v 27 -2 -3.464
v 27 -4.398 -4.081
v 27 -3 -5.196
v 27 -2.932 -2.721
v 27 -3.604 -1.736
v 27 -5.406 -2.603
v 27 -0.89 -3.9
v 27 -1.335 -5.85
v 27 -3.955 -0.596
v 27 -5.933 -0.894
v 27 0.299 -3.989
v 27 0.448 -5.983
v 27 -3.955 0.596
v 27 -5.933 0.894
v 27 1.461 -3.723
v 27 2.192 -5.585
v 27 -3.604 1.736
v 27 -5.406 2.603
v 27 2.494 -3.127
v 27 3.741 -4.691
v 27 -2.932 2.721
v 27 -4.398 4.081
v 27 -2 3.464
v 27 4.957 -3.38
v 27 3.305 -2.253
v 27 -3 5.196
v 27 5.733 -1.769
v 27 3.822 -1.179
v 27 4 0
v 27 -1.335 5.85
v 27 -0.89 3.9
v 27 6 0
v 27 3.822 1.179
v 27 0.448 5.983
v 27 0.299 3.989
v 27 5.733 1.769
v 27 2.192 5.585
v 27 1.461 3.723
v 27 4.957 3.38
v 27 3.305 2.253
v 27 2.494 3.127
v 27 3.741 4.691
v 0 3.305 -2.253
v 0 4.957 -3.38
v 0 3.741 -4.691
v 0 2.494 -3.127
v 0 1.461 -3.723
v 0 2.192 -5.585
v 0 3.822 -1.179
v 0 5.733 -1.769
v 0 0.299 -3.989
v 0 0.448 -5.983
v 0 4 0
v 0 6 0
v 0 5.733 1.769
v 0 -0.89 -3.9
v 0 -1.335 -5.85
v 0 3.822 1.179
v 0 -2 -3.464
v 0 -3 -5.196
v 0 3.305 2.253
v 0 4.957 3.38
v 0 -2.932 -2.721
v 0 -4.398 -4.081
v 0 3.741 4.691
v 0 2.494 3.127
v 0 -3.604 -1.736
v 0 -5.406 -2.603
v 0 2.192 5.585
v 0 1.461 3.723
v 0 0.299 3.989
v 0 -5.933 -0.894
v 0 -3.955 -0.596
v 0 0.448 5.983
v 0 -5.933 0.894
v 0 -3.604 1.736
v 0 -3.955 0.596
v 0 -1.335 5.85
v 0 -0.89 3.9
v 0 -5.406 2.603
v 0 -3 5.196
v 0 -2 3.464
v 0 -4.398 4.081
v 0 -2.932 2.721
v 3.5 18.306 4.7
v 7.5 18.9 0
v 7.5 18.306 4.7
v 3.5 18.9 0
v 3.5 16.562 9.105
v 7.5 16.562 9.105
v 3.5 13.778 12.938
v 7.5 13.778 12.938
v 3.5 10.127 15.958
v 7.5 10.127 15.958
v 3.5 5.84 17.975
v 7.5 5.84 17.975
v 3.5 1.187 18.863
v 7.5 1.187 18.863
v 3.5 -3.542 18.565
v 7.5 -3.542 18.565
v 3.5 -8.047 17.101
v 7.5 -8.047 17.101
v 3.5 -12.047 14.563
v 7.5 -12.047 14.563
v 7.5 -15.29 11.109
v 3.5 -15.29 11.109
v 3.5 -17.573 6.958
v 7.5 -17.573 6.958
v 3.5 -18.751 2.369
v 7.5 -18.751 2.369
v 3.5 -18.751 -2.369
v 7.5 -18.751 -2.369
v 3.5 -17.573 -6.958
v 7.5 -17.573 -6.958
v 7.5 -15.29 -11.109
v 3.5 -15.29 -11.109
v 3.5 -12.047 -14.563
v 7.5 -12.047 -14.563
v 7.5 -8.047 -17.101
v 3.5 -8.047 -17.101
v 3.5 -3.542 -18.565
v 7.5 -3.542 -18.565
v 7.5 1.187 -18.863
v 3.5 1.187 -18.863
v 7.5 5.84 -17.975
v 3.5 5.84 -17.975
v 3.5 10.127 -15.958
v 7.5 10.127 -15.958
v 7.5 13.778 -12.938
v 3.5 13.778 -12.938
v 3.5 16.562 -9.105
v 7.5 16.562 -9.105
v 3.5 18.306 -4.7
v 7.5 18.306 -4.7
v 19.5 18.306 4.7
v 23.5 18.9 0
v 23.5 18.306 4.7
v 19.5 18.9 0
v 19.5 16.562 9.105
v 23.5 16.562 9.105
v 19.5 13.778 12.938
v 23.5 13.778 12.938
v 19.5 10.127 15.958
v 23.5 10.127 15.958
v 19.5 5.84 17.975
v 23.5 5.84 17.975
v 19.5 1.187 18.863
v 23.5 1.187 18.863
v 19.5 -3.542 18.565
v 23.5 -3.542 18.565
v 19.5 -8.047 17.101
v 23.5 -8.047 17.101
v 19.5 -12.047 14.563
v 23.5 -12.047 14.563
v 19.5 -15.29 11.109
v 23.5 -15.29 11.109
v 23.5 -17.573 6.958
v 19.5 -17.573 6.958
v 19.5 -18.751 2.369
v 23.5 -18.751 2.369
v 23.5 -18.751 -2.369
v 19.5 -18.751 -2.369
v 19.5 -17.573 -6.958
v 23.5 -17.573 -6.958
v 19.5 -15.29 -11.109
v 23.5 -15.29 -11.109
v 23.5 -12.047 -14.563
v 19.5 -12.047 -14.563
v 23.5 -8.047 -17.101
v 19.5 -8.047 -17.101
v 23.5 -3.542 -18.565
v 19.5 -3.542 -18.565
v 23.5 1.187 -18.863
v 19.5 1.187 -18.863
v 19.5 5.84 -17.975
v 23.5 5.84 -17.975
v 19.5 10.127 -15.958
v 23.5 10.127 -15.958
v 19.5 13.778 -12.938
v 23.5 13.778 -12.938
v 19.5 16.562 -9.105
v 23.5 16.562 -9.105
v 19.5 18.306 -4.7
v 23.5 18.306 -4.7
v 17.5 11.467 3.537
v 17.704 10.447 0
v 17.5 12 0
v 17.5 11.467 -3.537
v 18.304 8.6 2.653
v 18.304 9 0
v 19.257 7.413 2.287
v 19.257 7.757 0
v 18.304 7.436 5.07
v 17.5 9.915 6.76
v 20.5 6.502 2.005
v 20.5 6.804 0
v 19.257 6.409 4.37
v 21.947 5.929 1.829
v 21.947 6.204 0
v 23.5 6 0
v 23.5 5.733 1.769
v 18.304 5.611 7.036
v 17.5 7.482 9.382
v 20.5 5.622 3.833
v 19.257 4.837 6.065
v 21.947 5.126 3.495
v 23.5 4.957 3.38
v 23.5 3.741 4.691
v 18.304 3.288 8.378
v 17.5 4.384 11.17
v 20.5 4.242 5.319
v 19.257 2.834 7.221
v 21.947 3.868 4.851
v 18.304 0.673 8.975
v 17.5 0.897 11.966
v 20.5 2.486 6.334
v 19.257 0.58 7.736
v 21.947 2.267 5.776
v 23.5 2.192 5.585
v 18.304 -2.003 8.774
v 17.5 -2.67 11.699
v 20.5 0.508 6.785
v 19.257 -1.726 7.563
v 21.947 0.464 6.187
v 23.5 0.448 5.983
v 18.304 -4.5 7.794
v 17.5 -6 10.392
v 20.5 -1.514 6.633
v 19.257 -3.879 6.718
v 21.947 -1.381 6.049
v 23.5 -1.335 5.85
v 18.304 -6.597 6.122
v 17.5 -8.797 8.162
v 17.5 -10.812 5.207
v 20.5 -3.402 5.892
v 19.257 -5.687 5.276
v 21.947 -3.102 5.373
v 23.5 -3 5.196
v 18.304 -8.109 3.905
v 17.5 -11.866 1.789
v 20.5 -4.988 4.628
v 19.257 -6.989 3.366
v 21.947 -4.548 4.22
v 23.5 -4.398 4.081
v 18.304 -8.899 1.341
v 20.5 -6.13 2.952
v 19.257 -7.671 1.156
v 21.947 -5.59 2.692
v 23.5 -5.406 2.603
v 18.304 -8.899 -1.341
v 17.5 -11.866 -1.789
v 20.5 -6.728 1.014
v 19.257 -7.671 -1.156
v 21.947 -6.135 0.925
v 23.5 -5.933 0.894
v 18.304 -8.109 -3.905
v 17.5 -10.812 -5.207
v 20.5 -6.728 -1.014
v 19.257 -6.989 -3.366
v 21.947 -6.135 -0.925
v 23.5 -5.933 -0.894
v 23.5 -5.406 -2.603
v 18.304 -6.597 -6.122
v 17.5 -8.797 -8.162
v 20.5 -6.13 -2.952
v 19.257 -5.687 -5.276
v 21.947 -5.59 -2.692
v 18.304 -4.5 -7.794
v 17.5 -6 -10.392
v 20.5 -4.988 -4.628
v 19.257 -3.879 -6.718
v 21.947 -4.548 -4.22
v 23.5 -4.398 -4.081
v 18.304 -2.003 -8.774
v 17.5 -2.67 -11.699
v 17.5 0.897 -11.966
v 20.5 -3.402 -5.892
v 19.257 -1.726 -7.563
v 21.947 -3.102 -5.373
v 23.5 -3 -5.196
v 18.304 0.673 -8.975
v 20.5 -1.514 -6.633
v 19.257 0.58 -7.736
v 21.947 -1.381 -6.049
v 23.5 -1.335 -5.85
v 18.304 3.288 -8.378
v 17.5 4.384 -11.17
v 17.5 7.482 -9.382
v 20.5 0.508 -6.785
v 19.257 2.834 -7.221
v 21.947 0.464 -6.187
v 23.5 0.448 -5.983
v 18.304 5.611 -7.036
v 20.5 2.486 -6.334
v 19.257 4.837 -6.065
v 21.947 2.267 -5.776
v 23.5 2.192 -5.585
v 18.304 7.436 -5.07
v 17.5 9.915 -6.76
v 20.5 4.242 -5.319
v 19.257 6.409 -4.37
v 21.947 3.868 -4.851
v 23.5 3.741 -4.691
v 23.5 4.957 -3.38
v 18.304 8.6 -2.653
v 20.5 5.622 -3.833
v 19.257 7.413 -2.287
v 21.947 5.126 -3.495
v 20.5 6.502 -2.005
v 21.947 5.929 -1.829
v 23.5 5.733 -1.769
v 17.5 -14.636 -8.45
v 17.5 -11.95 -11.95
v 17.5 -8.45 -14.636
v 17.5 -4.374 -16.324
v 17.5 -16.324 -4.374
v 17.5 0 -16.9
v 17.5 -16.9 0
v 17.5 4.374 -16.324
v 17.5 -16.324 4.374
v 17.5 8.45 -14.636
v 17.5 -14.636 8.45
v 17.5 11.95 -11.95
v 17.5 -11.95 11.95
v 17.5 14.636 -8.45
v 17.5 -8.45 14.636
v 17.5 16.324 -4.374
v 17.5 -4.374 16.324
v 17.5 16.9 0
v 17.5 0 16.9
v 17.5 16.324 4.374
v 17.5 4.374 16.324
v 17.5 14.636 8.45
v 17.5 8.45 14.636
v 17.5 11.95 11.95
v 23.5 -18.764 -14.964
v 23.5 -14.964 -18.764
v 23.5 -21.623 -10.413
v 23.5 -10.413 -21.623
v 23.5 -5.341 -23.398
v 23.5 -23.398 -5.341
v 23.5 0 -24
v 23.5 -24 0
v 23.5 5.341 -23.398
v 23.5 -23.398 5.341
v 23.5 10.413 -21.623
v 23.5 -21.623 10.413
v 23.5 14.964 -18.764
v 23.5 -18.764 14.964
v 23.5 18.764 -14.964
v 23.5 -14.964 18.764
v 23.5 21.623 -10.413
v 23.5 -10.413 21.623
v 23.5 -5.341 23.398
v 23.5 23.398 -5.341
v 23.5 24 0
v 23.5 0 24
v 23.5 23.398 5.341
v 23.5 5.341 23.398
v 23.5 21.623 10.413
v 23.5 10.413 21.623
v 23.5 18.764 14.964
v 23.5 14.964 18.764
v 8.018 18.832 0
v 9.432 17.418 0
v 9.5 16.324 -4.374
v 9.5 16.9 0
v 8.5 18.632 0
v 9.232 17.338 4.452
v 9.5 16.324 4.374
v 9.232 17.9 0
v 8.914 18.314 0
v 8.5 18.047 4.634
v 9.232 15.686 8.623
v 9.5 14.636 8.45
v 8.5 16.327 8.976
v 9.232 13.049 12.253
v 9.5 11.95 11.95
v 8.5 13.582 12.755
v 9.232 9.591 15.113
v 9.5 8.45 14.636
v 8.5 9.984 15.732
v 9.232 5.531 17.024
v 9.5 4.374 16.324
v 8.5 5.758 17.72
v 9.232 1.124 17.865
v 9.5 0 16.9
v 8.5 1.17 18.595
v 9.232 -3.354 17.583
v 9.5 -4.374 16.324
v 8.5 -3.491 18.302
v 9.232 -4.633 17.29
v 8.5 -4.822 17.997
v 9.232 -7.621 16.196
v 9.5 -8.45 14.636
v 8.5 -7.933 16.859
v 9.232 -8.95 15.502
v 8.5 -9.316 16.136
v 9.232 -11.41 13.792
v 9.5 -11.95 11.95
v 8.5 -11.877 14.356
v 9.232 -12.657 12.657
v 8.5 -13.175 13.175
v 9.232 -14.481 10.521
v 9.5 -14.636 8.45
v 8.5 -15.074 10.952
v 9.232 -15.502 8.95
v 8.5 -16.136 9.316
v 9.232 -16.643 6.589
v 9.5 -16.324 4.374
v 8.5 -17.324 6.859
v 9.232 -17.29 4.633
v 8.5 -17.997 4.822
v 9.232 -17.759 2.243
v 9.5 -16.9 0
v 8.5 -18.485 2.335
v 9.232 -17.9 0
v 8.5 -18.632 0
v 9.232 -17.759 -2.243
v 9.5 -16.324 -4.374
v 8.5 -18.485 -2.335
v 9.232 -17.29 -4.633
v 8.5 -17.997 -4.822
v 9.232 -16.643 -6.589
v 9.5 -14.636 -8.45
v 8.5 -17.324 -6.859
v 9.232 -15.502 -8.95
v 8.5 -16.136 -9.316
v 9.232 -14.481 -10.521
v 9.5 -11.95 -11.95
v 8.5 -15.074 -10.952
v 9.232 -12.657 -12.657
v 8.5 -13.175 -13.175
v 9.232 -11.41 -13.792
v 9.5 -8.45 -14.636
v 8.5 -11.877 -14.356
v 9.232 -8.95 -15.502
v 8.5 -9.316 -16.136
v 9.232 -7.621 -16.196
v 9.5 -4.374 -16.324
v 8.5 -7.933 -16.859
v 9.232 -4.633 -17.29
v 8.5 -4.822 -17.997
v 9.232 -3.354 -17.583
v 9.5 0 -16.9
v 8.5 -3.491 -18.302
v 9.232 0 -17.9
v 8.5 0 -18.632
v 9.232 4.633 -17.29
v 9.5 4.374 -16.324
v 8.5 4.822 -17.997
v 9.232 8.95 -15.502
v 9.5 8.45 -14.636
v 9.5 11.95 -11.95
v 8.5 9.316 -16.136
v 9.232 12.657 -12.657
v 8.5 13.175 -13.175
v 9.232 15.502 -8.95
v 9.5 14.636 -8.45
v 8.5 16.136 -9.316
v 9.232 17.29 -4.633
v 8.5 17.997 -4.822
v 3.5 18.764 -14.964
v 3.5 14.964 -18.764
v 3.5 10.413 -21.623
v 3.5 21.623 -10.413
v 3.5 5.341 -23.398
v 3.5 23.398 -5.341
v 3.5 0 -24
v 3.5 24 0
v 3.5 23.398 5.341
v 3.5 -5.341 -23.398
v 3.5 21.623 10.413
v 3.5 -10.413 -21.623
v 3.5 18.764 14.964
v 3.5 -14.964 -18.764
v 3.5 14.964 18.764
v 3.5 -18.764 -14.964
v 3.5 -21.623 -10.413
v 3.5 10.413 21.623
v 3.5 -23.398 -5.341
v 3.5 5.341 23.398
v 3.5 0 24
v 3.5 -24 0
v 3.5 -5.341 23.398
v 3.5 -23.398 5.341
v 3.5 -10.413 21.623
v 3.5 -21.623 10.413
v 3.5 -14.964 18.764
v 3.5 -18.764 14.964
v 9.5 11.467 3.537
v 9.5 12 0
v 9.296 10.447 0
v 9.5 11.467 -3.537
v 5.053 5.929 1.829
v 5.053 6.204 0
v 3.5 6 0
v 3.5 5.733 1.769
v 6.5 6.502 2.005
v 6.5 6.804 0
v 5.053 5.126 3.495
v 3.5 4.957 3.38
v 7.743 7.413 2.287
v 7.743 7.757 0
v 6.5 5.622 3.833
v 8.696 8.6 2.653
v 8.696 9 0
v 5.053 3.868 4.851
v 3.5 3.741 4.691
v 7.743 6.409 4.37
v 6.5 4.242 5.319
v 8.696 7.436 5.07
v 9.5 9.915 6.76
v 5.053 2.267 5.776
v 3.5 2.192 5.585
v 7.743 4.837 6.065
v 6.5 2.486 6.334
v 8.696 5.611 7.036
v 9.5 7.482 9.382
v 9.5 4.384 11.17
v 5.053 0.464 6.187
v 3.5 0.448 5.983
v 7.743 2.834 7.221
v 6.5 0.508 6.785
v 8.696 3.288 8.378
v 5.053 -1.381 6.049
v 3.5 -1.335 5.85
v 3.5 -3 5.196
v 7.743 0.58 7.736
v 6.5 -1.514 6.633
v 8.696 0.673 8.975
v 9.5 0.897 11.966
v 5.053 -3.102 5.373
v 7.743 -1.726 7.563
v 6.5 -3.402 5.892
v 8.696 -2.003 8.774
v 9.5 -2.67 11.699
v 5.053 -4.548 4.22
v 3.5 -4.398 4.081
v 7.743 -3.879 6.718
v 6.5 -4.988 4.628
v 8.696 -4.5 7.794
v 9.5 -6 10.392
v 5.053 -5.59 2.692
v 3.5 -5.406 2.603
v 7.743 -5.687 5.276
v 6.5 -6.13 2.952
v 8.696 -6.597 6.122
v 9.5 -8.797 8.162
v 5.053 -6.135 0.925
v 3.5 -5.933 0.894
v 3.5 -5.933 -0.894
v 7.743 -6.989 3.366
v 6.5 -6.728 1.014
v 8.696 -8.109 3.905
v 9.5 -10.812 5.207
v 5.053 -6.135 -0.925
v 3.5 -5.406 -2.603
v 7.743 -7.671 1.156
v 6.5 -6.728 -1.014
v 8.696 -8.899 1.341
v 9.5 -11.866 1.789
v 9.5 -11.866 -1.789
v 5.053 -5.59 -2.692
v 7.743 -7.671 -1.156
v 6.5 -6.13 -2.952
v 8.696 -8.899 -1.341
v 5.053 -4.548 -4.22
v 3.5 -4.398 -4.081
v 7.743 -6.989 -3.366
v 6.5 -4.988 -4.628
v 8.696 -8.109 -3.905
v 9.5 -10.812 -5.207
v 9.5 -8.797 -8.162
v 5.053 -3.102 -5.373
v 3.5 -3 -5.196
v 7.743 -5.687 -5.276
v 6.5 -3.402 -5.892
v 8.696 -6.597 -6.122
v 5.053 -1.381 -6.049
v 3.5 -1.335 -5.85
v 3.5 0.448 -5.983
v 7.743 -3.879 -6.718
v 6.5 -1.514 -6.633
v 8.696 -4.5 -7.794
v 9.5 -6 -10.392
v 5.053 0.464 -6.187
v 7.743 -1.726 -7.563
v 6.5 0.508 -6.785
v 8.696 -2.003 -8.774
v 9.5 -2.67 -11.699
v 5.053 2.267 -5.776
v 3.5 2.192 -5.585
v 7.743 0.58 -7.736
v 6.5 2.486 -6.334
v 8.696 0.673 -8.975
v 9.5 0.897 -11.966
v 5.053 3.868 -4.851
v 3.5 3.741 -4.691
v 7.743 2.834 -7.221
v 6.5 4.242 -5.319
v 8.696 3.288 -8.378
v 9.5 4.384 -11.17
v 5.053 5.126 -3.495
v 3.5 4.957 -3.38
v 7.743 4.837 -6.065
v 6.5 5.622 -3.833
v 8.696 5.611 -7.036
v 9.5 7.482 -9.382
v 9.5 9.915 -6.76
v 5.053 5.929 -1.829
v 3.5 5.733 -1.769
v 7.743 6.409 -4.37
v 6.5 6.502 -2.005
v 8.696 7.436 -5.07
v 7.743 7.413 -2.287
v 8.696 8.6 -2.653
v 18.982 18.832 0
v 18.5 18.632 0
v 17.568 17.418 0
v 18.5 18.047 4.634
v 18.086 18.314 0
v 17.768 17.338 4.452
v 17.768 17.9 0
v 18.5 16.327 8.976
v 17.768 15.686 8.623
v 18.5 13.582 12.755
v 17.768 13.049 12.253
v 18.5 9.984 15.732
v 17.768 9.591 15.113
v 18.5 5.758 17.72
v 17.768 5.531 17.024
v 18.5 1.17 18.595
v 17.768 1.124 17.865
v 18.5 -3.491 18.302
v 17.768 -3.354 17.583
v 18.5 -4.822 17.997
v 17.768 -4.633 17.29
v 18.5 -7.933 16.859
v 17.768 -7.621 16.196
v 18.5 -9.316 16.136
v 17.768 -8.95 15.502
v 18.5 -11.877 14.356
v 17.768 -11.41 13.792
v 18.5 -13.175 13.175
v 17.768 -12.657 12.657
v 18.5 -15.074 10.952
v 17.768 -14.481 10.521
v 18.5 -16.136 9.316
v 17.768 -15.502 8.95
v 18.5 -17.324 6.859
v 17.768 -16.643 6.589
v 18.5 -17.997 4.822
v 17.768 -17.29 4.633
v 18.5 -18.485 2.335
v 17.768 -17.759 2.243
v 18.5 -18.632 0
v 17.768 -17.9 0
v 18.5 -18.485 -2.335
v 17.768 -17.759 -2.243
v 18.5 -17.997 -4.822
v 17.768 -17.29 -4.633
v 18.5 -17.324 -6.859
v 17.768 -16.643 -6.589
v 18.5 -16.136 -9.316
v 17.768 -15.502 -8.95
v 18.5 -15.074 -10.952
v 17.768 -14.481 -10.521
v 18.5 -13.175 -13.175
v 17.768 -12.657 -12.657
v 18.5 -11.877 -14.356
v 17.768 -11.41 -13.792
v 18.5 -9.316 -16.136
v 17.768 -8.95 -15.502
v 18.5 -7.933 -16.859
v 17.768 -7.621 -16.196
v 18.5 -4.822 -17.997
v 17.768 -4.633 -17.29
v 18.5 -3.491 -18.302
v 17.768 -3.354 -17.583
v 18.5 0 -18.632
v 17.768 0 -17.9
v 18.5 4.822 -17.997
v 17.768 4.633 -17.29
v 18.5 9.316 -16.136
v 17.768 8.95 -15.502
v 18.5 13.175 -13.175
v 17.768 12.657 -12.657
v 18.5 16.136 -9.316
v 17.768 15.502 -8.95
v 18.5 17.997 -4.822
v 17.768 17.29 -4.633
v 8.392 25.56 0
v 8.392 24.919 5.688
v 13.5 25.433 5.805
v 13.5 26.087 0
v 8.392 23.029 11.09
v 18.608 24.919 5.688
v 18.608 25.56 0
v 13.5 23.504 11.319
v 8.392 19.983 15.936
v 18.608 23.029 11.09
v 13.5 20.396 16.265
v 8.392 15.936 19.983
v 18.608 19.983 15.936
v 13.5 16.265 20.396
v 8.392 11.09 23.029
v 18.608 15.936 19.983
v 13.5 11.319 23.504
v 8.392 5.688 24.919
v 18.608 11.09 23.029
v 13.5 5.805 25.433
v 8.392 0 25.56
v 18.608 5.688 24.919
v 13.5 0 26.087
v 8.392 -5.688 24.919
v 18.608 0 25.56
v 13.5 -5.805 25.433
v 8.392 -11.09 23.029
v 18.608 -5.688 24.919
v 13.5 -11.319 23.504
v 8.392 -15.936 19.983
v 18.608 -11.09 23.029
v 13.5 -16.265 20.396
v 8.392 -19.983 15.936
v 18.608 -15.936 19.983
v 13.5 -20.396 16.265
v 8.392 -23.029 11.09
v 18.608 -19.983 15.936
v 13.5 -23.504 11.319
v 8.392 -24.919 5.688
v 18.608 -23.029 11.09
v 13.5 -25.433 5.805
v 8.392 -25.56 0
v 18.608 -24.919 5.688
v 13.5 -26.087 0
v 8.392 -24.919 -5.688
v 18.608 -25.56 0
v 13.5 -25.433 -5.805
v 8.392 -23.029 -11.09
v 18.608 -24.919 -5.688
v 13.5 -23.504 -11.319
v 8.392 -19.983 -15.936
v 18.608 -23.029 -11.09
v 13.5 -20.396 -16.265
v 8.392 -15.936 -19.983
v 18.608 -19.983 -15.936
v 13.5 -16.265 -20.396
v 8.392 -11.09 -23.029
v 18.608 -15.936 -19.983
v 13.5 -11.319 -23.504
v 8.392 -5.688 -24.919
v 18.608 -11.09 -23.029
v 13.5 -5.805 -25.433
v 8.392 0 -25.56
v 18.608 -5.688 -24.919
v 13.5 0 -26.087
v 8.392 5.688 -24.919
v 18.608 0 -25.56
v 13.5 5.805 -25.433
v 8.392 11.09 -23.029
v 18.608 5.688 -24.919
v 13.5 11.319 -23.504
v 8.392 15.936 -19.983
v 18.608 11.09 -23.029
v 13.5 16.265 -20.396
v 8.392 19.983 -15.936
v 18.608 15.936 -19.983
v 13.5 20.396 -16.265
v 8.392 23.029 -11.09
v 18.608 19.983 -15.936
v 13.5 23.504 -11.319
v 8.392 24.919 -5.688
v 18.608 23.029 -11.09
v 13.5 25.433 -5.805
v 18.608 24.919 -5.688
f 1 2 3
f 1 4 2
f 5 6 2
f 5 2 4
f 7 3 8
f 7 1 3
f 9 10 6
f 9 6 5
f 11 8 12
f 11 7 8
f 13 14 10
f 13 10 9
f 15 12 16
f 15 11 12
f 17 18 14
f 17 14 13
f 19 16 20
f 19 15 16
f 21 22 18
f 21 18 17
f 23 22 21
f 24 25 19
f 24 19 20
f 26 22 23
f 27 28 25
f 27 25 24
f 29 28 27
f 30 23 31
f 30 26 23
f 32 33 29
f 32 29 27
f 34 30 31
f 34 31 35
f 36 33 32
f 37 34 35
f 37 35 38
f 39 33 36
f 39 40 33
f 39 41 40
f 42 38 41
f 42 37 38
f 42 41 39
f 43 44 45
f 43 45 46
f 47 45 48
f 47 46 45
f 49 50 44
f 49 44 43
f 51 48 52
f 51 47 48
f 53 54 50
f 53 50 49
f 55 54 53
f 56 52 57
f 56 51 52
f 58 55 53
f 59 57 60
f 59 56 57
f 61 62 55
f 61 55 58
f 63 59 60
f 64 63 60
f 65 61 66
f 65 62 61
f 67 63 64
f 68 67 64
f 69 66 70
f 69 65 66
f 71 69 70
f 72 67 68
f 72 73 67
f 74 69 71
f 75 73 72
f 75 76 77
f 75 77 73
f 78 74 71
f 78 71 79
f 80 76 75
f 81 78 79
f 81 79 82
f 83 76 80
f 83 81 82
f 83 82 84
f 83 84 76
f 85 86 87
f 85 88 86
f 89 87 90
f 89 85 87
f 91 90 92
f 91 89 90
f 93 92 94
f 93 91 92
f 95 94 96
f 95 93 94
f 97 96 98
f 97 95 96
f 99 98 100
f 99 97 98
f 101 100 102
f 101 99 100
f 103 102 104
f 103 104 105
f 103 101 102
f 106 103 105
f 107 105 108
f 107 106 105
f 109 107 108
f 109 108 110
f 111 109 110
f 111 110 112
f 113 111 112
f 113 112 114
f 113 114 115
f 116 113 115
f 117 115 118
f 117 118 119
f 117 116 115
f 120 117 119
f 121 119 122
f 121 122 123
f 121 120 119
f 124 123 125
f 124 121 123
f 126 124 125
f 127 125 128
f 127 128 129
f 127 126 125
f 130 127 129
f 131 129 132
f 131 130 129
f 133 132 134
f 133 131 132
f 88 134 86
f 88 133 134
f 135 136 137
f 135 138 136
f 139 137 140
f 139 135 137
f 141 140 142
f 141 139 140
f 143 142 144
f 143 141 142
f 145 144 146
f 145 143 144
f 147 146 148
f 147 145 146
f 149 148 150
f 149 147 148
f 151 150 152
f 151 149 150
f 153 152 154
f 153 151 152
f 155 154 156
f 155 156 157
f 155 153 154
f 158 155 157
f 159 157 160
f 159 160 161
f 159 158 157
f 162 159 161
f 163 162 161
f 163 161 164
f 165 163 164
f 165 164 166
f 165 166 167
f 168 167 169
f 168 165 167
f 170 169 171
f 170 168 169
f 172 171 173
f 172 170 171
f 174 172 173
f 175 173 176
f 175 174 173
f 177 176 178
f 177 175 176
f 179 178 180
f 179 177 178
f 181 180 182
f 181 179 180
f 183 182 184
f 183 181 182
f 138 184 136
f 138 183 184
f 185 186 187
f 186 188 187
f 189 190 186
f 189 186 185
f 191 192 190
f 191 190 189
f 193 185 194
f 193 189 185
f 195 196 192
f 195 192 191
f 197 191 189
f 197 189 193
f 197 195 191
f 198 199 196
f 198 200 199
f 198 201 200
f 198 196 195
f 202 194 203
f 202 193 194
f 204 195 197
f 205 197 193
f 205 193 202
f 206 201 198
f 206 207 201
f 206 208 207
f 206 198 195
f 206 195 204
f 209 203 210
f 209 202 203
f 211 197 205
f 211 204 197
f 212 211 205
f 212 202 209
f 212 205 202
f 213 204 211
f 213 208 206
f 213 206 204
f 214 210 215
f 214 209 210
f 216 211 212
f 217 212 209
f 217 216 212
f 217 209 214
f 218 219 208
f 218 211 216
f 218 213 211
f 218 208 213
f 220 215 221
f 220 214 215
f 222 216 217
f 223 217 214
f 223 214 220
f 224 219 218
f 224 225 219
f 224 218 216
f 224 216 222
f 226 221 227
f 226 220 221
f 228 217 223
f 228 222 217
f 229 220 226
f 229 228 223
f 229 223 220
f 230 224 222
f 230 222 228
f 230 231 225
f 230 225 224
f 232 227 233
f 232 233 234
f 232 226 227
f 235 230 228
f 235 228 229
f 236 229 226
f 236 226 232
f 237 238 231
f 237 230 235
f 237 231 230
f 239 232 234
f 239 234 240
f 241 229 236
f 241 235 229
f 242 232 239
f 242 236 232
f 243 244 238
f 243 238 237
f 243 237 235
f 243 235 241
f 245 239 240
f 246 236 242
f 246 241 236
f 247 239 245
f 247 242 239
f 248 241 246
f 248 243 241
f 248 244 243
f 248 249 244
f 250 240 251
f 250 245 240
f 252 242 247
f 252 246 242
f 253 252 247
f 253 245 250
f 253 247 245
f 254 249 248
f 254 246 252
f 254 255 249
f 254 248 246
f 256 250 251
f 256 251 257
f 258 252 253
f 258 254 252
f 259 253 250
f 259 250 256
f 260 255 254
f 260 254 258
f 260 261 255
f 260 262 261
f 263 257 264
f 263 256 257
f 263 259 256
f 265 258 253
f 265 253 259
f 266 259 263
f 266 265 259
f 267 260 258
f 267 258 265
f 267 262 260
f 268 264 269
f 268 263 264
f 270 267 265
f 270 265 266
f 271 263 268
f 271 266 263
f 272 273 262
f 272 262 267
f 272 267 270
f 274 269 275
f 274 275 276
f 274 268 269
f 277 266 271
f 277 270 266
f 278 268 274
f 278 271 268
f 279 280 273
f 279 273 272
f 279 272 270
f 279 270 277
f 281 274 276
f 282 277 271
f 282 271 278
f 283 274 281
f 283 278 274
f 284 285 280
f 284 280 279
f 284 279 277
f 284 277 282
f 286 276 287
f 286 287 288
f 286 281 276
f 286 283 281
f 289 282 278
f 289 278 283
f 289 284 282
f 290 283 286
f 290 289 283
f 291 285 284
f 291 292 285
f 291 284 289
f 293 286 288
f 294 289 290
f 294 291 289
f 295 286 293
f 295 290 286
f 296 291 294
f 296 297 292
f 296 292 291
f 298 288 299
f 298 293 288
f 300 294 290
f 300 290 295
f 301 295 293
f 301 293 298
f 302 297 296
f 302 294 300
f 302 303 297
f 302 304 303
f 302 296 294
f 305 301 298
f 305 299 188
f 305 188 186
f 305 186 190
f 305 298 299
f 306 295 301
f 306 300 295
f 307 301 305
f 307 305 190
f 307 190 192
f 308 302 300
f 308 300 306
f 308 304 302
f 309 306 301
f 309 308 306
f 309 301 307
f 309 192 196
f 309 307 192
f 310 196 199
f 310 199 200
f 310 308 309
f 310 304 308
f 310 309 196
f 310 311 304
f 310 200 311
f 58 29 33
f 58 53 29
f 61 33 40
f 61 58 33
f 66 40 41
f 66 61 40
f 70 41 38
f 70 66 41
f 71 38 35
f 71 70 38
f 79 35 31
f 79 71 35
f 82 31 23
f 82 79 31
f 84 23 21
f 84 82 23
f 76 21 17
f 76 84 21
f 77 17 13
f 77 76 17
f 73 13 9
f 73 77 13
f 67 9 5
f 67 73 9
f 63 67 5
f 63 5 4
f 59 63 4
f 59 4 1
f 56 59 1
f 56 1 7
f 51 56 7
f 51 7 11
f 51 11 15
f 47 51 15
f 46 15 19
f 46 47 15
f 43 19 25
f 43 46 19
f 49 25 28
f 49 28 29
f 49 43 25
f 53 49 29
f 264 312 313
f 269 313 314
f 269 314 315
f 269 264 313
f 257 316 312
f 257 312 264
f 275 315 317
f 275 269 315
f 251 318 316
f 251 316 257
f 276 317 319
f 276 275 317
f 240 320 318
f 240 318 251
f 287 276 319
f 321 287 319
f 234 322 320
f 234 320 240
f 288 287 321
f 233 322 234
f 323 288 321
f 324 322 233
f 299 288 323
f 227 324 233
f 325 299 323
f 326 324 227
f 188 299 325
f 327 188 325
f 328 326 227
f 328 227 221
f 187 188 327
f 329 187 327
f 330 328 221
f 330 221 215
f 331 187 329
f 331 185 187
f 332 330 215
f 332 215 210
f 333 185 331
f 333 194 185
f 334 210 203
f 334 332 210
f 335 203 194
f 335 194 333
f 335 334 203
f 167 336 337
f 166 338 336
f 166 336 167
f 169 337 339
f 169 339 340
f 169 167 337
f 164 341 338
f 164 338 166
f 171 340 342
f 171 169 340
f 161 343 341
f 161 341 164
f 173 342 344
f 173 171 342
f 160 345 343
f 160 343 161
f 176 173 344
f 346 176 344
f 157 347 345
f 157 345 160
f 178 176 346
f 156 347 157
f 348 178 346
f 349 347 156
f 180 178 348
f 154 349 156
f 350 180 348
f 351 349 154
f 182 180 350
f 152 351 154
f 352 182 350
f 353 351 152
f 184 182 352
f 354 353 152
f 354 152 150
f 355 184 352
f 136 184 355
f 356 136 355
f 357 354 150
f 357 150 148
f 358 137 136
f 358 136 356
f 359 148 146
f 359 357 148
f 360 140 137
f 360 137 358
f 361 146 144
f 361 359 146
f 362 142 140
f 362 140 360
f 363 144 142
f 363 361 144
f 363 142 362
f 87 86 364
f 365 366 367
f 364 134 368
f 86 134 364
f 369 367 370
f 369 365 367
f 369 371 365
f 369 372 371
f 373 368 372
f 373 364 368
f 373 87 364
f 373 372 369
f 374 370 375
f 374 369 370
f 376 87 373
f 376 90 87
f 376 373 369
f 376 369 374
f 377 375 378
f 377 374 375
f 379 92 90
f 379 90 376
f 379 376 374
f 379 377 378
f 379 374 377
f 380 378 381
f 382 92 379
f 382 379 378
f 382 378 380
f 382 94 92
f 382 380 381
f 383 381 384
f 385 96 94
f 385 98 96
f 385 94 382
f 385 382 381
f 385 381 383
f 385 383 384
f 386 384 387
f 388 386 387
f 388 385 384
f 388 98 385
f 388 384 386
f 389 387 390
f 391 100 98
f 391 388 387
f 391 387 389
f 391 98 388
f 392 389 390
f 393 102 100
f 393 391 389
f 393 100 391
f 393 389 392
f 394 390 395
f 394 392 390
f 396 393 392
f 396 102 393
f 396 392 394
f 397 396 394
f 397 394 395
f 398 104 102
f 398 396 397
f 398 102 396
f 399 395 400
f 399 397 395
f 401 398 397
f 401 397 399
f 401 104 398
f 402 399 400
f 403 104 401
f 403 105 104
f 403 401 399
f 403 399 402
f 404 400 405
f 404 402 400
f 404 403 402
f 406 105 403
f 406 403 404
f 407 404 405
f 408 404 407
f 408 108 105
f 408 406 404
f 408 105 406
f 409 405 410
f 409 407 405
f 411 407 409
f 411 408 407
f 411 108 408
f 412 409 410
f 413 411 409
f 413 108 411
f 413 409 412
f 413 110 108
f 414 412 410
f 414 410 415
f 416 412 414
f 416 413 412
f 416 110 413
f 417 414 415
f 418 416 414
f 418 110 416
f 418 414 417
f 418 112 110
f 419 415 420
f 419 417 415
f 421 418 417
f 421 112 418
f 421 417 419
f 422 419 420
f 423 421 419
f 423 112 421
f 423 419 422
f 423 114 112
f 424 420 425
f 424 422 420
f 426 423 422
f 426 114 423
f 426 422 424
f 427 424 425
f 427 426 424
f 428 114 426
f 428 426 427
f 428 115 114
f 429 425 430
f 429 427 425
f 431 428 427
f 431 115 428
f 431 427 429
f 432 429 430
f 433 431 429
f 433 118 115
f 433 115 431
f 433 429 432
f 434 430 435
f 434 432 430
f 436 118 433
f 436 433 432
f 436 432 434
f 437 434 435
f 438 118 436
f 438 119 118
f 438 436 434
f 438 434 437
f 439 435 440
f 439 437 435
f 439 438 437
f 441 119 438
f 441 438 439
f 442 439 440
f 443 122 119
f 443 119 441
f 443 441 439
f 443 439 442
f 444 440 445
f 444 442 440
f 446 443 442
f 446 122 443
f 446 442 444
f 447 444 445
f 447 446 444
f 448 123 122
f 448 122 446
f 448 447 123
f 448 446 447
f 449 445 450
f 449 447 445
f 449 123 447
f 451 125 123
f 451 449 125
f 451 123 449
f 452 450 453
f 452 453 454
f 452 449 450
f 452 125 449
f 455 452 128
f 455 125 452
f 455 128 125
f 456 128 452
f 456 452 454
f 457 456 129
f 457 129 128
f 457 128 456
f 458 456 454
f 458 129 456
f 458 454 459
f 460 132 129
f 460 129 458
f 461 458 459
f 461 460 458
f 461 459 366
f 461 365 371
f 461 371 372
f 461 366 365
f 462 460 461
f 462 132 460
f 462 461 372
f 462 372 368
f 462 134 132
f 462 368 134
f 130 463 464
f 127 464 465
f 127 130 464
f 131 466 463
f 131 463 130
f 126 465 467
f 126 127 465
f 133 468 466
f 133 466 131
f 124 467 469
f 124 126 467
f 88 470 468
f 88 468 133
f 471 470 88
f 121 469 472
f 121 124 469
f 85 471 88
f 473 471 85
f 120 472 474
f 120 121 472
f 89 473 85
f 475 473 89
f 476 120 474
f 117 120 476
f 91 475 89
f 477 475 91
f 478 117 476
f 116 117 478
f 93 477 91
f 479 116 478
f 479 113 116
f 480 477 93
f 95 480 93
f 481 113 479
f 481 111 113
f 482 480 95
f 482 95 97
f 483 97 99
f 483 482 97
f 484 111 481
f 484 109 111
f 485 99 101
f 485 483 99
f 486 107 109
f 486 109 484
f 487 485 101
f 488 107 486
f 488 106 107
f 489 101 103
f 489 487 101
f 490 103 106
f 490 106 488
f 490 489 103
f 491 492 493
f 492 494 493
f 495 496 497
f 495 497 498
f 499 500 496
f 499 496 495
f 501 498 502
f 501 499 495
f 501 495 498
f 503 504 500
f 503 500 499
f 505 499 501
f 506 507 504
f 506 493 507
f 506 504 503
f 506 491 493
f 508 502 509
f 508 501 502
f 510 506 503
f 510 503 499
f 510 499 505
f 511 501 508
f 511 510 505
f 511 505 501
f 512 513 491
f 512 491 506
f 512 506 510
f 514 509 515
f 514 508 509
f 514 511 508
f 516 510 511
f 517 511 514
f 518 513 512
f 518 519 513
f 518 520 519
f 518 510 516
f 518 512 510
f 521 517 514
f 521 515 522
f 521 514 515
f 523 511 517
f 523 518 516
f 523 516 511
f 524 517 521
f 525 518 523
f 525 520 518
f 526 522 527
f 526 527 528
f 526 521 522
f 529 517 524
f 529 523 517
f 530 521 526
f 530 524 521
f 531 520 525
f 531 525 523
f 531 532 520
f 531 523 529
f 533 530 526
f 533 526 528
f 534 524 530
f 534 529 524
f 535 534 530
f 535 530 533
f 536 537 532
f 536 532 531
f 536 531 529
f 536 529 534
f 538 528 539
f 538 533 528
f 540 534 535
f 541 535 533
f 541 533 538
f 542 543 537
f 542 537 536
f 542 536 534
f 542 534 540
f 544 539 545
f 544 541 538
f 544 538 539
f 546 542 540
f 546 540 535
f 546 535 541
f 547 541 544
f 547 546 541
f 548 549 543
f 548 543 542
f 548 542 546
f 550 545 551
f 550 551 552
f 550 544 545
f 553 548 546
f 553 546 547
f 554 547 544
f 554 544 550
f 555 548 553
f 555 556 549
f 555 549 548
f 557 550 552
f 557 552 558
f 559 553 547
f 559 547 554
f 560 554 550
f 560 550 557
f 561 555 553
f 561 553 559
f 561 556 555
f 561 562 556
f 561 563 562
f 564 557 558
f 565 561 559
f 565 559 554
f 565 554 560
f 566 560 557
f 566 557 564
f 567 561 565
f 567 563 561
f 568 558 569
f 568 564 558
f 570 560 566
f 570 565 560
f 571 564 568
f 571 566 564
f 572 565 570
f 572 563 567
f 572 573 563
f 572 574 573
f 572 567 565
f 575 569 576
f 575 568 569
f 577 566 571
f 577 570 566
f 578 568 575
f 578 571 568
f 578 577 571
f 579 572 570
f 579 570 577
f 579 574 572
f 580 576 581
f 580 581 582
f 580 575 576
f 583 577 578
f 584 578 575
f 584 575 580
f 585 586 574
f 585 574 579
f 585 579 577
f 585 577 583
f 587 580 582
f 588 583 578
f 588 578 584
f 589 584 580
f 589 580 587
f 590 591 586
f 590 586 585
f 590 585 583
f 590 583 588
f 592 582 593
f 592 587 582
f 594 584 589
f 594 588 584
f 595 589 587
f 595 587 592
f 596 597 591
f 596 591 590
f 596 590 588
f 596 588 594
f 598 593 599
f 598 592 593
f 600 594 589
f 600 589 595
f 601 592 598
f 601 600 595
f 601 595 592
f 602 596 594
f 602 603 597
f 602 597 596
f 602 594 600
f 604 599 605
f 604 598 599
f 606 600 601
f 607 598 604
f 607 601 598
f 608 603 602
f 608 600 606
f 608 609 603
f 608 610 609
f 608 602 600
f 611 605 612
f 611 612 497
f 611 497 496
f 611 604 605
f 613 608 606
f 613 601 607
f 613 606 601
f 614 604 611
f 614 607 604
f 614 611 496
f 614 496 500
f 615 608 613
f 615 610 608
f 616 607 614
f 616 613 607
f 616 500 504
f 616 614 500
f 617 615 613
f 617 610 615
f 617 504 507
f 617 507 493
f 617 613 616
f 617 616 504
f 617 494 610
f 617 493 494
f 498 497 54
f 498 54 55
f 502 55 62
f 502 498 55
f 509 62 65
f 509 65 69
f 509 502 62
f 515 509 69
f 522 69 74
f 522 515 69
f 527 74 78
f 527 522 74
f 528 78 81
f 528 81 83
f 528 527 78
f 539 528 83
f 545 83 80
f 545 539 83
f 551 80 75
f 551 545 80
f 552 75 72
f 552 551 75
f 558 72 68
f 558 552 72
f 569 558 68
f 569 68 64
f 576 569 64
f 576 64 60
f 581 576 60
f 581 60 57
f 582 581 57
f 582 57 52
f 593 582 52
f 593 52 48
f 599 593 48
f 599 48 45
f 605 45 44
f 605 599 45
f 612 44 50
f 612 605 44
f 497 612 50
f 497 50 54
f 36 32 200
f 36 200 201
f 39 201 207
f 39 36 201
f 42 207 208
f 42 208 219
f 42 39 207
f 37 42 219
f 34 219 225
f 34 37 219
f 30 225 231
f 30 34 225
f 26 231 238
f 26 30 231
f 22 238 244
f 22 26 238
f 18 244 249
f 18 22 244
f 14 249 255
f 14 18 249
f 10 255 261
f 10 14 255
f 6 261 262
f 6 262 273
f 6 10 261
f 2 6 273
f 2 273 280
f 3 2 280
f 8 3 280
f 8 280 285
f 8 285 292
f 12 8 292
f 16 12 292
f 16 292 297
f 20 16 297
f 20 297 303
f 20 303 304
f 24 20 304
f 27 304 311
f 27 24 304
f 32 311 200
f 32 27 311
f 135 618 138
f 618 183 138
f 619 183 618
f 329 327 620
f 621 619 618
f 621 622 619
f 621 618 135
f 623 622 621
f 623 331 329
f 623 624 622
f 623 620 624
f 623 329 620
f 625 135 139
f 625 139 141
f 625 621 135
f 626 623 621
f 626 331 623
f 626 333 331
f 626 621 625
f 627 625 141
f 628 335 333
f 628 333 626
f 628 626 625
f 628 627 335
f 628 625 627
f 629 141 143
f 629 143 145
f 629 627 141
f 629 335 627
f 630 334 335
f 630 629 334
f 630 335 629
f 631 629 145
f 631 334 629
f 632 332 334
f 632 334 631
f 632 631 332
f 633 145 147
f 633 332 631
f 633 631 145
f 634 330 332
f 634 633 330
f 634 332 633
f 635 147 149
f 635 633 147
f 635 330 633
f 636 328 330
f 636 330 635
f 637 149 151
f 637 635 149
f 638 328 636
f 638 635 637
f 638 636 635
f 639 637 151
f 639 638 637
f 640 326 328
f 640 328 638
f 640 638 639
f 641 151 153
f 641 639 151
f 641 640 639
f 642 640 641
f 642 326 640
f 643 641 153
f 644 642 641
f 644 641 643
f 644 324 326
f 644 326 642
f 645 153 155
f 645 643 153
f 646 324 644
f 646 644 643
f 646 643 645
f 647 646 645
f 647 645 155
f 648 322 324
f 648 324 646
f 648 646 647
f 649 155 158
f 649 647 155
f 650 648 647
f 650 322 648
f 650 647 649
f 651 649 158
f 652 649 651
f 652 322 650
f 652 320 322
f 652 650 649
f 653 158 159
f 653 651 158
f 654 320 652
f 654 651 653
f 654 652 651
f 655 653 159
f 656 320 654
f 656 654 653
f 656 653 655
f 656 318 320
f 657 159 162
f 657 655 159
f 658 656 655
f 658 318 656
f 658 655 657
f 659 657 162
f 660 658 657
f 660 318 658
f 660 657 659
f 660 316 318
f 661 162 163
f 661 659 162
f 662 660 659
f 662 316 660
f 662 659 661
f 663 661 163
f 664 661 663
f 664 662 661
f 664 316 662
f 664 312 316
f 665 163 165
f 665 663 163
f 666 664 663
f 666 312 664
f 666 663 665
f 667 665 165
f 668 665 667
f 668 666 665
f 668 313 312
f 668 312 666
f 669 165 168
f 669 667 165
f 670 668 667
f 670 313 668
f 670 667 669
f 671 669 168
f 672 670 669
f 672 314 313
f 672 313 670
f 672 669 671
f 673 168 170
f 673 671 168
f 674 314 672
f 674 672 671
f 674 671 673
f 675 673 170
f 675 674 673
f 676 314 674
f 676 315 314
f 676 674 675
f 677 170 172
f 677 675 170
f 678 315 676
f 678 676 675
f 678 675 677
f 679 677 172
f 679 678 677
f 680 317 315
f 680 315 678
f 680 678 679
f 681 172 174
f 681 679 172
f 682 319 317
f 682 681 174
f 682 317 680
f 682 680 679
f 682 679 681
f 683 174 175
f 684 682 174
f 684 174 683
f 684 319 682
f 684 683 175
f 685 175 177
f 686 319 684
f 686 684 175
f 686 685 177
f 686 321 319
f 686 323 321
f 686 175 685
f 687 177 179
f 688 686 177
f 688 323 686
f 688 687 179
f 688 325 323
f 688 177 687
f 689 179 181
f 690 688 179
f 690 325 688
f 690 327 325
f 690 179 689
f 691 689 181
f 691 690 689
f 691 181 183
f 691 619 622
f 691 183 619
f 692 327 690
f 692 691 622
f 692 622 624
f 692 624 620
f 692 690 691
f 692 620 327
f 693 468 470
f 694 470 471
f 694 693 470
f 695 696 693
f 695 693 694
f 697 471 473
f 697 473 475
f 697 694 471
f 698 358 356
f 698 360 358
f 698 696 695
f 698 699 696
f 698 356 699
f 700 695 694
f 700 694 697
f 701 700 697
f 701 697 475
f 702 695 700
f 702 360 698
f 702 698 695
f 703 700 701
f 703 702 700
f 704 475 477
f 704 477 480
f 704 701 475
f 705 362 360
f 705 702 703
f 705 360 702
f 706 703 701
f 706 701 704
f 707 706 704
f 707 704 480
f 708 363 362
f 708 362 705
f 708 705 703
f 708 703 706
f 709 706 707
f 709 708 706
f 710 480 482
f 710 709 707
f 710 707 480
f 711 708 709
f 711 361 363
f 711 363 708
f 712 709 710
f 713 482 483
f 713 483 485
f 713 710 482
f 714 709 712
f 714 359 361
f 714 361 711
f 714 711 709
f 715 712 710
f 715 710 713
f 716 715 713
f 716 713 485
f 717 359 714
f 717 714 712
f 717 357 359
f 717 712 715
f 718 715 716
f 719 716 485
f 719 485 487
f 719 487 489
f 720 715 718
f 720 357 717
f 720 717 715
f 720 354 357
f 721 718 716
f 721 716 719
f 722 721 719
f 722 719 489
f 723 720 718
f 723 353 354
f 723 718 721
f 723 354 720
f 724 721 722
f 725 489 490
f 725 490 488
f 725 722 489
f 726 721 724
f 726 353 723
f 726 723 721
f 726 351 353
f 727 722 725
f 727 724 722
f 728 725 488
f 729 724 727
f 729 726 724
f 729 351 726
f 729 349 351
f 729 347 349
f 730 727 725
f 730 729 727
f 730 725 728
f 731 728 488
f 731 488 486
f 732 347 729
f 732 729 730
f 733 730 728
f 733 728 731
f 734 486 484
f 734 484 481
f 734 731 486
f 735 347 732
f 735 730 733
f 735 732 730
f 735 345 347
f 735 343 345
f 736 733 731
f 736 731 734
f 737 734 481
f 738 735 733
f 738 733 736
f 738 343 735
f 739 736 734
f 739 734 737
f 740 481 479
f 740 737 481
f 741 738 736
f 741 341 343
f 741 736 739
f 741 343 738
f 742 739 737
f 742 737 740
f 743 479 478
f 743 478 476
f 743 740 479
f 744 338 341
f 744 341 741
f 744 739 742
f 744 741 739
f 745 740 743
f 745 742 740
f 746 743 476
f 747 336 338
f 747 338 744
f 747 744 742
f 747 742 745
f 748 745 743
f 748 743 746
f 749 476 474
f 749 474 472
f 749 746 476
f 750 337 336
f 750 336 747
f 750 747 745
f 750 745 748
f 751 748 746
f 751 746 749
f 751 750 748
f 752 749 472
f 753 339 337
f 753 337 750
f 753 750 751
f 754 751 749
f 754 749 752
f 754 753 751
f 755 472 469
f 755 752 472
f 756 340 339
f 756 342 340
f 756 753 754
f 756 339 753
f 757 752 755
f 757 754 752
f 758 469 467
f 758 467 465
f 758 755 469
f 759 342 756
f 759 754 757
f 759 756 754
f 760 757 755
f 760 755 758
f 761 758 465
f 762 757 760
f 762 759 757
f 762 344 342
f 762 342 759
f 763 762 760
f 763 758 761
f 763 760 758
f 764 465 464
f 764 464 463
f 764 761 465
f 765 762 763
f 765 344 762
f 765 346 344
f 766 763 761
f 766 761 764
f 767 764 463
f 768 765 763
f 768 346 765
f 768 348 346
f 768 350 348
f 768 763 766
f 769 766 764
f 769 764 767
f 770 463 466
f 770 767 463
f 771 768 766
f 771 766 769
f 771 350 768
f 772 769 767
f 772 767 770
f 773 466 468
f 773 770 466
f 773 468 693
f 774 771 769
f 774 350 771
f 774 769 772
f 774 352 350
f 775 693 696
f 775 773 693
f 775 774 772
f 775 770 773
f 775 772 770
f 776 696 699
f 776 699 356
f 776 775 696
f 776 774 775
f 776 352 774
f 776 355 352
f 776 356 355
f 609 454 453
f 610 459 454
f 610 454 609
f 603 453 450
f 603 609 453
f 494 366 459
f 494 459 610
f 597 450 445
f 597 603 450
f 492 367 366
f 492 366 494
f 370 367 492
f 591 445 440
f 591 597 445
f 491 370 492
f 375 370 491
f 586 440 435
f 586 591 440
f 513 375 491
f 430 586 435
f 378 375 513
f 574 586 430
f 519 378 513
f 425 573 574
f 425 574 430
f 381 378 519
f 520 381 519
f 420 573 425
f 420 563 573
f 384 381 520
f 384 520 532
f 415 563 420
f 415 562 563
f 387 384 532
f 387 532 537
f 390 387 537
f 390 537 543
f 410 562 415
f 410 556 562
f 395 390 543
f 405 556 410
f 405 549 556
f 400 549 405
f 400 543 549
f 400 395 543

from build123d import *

# Parameters (mm, degrees)
FILLET1_R = 6


with BuildPart() as part:
    # Sketch1 → Revolve1 (revolve)
    with BuildSketch(Plane.XY):
        with BuildLine():
            Line((0, 4), (0, 6))
            Line((0, 6), (3.5, 6))
            Line((3.5, 6), (9.5, 6))
            Line((9.5, 6), (9.5, 16.9))
            ThreePointArc((9.5, 16.9), (8.914213562, 18.314213562), (7.5, 18.9))
            Line((7.5, 18.9), (3.5, 18.9))
            Line((3.5, 18.9), (3.5, 24))
            ThreePointArc((3.5, 24), (13.5, 26.087121525), (23.5, 24))
            Line((23.5, 24), (23.5, 18.9))
            Line((23.5, 18.9), (19.5, 18.9))
            ThreePointArc((19.5, 18.9), (18.085786438, 18.314213562), (17.5, 16.9))
            Line((17.5, 16.9), (17.5, 6))
            Line((17.5, 6), (23.5, 6))
            Line((23.5, 6), (27, 6))
            Line((27, 6), (27, 4))
            Line((27, 4), (0, 4))
        make_face()
    revolve(axis=Axis((0, 0, 0), (1, 0, 0)))

    # Fillet1
    fillet1_edges = [part.edges().sort_by_distance(p)[0] for p in [
        (9.5, -6, 0),
        (17.5, -6, 0),
    ]]
    fillet(fillet1_edges, radius=FILLET1_R)


solid = part.part
